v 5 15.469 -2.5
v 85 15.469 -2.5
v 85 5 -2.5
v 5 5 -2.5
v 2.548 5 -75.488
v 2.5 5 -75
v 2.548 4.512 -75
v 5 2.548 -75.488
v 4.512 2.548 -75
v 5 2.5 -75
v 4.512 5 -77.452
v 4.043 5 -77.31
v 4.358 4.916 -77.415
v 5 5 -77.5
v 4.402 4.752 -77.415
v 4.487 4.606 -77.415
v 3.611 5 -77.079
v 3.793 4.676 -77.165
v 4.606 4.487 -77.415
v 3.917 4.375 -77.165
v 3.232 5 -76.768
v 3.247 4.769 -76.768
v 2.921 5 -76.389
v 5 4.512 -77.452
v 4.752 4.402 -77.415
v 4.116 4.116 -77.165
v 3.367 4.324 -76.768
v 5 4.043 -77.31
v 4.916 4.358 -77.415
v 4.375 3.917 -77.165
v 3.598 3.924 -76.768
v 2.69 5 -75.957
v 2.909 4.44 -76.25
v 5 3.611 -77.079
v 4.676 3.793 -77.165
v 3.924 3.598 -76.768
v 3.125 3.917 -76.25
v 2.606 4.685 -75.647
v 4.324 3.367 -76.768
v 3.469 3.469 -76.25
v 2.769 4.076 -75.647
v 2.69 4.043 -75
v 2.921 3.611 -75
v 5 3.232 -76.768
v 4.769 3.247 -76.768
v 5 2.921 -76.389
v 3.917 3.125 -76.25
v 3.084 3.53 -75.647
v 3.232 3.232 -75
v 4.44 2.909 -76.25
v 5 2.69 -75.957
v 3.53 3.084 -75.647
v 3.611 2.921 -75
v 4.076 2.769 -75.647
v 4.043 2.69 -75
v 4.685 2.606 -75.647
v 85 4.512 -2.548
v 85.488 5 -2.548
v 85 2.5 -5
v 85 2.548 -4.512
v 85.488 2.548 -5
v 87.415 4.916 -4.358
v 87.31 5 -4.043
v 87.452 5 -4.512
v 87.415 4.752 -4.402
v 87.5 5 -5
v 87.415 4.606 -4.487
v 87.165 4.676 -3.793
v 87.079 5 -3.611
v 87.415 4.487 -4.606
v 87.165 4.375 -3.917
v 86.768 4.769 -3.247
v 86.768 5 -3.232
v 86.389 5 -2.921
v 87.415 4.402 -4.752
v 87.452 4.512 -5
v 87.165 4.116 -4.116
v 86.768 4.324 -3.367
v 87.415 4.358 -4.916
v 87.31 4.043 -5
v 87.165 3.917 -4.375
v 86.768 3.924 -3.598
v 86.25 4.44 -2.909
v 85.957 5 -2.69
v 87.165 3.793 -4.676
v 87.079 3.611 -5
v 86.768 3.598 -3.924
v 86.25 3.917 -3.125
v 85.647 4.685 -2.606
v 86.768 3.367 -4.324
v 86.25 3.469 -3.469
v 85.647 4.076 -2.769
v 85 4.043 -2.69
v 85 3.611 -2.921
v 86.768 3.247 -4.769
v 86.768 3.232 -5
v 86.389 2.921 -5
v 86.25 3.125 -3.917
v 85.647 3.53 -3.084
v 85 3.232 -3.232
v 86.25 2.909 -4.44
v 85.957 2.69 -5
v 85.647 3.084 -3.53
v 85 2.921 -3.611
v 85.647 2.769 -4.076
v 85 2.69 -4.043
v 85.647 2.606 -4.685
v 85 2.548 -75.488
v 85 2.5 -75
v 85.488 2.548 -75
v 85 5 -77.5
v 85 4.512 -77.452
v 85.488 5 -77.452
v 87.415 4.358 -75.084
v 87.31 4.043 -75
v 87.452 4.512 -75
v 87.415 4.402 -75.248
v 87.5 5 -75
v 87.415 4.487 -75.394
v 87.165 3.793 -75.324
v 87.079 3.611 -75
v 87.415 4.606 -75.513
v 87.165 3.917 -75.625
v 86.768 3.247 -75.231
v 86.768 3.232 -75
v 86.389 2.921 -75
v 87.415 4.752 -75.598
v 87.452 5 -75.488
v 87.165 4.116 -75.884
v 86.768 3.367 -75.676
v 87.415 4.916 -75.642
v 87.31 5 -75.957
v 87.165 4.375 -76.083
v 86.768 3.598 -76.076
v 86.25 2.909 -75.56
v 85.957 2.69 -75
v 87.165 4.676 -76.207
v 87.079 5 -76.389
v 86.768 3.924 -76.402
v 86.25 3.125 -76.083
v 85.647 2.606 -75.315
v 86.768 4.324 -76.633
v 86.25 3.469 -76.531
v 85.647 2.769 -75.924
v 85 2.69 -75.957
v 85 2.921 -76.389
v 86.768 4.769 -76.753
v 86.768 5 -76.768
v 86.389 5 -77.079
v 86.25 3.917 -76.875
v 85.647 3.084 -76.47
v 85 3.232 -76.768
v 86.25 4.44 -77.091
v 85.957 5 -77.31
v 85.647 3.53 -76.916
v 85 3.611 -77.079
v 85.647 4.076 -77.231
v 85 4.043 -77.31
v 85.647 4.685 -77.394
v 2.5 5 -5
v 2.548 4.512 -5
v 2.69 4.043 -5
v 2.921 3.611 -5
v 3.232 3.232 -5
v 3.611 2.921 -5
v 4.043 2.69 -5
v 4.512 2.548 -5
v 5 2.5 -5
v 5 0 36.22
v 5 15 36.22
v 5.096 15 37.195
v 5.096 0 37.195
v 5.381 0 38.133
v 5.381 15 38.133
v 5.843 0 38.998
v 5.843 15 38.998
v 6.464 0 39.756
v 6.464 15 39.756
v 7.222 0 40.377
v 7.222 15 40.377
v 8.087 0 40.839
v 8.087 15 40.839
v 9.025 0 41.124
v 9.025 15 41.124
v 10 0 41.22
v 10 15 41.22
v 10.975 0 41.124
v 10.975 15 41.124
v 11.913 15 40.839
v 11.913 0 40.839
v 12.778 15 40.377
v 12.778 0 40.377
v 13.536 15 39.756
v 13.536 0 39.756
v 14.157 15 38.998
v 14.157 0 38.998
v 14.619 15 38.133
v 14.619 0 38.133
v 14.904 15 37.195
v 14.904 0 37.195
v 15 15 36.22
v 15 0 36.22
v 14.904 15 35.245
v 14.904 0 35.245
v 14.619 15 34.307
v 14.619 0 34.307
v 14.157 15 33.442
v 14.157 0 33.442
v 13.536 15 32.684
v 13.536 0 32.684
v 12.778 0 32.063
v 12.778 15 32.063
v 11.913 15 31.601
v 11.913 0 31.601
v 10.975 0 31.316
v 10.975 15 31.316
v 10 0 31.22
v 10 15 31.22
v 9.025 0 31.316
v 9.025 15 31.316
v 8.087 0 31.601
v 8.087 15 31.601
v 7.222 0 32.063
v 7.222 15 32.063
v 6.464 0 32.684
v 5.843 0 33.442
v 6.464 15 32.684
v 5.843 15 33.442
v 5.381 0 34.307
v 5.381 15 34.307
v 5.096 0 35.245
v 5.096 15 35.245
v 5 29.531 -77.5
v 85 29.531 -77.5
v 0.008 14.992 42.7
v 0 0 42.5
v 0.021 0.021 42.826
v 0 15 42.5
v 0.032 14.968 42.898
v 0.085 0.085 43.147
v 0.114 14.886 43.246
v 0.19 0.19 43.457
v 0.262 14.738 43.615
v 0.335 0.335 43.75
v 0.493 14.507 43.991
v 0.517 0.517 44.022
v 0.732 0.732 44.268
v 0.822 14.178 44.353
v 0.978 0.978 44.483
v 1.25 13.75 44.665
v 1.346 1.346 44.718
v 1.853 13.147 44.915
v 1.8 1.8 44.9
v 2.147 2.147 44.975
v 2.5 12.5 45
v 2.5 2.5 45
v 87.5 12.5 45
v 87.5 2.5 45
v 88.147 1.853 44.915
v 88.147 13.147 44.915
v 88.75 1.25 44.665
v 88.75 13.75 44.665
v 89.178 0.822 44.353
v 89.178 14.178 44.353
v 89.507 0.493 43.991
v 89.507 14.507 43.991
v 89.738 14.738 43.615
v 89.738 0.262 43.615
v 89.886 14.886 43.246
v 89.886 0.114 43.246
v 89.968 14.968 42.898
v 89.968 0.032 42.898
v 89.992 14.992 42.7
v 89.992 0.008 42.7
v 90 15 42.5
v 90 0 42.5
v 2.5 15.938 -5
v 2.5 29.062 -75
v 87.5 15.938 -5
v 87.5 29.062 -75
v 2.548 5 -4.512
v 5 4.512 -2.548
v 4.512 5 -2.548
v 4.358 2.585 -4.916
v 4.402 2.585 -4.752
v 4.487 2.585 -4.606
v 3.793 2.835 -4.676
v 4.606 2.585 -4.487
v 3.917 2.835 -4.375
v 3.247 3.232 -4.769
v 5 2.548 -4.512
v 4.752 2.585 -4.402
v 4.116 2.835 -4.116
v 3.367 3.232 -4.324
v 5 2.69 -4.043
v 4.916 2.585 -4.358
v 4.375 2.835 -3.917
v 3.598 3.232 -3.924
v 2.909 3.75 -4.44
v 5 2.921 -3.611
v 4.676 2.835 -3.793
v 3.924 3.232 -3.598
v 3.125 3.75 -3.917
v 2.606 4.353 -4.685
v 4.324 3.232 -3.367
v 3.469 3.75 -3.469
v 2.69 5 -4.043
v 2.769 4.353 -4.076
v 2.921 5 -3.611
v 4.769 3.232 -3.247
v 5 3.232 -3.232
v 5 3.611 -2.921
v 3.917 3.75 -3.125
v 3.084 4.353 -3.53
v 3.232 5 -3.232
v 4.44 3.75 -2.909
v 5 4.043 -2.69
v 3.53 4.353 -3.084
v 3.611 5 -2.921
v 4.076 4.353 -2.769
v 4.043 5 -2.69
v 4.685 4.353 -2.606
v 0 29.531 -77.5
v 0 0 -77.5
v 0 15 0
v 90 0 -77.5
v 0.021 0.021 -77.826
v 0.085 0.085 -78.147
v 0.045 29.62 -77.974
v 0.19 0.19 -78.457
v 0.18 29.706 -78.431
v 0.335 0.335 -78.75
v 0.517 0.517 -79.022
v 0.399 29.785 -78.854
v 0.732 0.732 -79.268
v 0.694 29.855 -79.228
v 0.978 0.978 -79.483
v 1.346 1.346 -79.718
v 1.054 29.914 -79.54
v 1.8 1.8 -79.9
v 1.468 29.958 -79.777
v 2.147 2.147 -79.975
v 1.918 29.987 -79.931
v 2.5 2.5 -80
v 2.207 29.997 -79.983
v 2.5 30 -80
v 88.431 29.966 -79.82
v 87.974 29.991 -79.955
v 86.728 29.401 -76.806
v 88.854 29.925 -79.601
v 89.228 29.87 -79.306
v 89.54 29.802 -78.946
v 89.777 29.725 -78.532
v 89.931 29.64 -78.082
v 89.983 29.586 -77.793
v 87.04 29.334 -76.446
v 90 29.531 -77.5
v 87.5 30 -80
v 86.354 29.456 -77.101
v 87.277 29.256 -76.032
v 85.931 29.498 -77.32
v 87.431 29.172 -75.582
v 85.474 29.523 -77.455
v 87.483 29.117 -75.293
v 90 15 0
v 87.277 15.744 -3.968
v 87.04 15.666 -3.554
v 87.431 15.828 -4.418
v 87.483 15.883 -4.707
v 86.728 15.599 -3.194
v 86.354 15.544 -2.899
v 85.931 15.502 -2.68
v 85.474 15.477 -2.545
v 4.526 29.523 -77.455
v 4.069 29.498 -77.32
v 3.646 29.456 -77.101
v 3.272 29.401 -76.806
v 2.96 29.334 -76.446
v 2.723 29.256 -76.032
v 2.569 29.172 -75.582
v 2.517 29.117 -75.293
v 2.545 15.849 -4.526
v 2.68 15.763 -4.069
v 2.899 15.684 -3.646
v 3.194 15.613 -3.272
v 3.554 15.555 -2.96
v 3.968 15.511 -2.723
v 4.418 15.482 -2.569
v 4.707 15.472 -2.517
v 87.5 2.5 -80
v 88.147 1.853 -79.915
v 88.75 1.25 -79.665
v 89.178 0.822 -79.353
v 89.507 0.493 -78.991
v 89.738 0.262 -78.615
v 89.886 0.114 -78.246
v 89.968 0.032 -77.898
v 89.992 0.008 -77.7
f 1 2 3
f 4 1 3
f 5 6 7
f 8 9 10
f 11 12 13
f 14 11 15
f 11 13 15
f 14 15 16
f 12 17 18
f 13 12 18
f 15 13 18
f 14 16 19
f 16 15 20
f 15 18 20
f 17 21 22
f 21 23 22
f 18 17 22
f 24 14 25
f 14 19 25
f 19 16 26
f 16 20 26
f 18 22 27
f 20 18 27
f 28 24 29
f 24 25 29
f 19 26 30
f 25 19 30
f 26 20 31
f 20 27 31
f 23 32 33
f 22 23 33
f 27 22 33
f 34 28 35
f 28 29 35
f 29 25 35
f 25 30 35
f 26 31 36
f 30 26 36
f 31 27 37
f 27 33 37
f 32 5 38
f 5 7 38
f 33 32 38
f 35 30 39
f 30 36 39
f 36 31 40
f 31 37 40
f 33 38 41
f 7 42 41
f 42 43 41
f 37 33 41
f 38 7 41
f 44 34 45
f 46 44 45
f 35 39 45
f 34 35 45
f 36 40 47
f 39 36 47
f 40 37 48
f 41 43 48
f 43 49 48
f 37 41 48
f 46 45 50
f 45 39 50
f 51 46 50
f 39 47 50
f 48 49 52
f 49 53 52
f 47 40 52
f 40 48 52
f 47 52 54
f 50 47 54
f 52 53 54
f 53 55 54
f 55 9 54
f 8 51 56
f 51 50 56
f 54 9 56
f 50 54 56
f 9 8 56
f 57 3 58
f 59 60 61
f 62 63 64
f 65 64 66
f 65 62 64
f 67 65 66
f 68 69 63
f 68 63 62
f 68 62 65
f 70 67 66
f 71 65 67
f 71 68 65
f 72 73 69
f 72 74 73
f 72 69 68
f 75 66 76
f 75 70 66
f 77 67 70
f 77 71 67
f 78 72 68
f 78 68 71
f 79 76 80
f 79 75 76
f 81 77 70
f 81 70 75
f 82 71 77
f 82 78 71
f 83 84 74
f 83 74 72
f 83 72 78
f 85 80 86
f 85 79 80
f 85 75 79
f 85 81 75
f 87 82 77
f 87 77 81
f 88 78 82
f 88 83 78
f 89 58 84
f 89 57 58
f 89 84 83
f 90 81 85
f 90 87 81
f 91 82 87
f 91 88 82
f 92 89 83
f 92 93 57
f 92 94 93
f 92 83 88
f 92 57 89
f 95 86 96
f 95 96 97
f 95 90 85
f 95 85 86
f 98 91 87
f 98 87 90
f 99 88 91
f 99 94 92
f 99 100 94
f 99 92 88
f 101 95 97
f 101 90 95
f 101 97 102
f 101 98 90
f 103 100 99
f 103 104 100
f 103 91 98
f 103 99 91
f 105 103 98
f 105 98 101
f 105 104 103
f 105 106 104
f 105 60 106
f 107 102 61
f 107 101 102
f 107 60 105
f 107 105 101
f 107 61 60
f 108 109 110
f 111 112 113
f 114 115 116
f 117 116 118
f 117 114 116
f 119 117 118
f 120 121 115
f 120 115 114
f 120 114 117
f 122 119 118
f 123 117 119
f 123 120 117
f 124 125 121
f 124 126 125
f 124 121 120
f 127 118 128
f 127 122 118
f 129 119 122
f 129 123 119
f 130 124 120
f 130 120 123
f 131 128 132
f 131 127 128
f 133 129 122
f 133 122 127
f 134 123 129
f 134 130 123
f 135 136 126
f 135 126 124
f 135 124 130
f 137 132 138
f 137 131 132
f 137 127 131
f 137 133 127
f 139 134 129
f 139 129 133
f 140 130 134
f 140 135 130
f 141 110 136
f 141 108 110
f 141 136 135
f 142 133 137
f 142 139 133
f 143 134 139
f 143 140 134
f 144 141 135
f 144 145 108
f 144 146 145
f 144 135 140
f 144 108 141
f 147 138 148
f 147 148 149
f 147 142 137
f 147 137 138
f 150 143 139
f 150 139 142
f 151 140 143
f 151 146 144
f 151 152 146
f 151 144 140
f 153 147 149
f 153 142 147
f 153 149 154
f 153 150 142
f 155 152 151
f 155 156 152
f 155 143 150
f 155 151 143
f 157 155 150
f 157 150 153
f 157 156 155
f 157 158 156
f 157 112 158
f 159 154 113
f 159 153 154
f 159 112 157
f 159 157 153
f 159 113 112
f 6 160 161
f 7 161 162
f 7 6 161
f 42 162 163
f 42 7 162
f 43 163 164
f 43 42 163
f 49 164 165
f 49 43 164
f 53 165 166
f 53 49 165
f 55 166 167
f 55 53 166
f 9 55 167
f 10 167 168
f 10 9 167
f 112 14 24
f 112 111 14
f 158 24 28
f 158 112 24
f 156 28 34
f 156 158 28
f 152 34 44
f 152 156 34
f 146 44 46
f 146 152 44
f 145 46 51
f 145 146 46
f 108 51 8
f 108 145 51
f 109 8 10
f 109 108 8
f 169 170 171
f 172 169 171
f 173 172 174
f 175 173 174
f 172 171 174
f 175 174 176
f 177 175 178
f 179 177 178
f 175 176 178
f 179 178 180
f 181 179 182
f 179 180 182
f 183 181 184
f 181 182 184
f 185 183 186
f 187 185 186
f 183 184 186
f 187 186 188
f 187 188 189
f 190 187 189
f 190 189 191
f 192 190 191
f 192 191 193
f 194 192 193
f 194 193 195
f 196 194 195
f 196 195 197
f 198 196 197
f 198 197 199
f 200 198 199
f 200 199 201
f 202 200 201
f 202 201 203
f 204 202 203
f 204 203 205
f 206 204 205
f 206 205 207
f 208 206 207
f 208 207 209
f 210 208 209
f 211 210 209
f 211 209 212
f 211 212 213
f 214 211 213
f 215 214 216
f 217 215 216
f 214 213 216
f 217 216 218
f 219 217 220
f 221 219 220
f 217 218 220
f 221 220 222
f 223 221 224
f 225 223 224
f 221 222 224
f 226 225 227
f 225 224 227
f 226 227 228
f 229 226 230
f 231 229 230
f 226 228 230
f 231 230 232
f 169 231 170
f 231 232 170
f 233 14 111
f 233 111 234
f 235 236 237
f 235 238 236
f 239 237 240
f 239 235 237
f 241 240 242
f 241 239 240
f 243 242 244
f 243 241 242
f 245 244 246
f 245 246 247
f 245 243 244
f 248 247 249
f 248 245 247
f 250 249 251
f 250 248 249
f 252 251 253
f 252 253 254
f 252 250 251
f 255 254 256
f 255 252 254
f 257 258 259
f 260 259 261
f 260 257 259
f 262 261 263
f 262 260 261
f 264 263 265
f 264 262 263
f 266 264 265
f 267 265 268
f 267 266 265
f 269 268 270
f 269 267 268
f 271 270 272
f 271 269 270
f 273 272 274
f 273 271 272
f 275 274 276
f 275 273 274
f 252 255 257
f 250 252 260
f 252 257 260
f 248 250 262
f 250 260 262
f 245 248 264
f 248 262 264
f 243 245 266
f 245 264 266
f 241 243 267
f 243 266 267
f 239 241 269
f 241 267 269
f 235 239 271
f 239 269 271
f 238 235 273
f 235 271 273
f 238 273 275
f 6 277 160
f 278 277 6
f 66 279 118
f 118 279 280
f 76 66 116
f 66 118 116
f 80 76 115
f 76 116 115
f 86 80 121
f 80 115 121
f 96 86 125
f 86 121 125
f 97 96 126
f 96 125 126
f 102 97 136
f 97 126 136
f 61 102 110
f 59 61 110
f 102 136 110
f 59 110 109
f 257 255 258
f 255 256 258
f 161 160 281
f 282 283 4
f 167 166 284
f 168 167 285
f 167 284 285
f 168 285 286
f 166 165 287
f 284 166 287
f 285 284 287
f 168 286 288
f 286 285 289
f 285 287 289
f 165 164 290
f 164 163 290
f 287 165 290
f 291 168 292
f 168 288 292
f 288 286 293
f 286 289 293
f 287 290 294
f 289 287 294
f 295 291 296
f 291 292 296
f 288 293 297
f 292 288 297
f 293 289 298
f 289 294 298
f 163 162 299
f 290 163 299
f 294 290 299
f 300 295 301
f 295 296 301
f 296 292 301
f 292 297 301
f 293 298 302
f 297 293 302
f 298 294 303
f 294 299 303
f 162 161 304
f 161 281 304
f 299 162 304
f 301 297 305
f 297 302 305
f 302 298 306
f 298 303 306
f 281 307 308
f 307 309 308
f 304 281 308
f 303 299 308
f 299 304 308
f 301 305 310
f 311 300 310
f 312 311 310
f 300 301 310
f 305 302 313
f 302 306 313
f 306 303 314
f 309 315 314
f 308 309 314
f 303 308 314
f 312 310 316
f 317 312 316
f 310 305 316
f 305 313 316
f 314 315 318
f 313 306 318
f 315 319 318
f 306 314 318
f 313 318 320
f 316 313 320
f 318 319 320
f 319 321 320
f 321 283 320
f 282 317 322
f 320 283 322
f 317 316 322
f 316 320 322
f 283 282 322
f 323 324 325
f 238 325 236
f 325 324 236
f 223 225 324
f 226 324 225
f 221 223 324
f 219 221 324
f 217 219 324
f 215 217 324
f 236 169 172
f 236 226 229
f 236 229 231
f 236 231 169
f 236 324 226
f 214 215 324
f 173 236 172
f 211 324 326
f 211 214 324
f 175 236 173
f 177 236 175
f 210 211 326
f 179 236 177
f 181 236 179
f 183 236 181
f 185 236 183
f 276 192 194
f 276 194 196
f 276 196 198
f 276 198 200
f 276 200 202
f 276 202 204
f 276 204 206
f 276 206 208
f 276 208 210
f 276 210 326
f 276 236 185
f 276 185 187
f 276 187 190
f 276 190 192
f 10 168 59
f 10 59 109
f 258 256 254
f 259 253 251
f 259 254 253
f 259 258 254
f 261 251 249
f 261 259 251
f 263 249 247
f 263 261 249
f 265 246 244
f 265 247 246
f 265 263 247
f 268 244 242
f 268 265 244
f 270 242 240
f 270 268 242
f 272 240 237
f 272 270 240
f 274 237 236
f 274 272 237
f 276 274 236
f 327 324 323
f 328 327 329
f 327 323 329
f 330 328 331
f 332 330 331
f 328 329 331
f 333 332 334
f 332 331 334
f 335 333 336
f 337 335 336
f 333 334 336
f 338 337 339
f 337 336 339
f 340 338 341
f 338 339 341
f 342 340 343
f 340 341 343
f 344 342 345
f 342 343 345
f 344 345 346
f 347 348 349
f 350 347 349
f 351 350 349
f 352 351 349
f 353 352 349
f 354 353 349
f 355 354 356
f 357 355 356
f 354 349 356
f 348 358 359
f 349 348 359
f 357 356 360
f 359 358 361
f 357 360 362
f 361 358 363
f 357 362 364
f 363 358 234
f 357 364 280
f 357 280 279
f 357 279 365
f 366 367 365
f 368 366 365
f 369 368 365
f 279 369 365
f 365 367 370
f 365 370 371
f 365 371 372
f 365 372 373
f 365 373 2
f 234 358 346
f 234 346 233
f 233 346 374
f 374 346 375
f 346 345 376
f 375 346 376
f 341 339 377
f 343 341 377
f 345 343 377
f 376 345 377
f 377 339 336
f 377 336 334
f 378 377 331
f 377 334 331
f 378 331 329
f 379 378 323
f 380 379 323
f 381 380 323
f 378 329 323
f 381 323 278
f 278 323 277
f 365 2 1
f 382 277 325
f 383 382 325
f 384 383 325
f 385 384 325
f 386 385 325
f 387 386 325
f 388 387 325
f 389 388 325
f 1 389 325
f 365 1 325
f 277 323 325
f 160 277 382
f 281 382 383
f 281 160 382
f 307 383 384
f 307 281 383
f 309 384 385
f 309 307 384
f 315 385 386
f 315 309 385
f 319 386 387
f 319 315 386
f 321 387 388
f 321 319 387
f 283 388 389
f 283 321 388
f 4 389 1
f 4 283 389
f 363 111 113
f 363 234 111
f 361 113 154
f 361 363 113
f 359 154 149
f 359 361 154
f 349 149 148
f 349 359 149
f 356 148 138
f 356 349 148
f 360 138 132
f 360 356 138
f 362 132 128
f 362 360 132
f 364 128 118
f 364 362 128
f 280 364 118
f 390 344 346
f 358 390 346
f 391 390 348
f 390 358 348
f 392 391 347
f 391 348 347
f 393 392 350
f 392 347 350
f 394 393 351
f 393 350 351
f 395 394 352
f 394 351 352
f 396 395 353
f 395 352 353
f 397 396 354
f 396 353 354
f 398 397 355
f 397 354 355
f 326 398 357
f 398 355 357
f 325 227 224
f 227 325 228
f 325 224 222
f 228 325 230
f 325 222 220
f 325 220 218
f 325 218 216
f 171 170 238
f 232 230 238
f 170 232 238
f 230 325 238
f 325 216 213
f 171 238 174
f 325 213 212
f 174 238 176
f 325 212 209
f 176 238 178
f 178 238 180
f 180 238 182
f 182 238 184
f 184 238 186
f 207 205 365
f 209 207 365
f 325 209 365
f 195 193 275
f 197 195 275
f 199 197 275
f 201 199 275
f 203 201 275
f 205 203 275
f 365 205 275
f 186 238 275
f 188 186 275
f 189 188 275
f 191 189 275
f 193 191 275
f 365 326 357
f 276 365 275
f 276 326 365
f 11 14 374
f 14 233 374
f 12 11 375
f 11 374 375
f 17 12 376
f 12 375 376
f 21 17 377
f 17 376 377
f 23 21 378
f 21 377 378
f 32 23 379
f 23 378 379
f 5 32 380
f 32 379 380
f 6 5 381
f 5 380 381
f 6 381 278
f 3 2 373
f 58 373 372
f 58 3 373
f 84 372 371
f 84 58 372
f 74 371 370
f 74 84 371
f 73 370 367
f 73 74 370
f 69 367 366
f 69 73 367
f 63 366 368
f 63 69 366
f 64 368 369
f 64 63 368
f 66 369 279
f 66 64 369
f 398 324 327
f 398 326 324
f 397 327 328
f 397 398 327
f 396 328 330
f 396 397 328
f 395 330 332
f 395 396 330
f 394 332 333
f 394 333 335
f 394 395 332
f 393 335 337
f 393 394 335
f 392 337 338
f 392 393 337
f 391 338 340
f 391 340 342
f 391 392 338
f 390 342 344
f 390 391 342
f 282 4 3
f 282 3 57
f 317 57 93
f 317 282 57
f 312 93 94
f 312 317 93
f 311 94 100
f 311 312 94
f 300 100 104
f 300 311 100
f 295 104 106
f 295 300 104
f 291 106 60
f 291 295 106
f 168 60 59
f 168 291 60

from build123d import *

# Parameters (mm, degrees)
BOSS_EXTRUDE1_DEPTH    = 90
SHELL1_T               = -2.5
SKETCH2_W              = 90
SKETCH2_H              = 45
BOSS_EXTRUDE2_DEPTH    = 15
F_10_0MM_DOWEL_HOLE1_D = 10
FILLET1_R              = 2.5


with BuildPart() as part:
    # Sketch1 → Boss-Extrude1 (new body)
    with BuildSketch(Plane(origin=(0, 0, 0), x_dir=(0, 0, -1), z_dir=(1, 0, 0))):
        Polygon((0, 0), (80, 0), (80, 30), (0, 15), align=None)
    extrude(amount=BOSS_EXTRUDE1_DEPTH)

    # Shell1
    shell1_openings = [part.faces().sort_by_distance(p)[0] for p in [
        (45, 22.5, -40),
    ]]
    offset(amount=SHELL1_T, openings=shell1_openings, kind=Kind.INTERSECTION)

    # Sketch2 → Boss-Extrude2 (add)
    with BuildSketch(Plane.XZ):
        with Locations((45, 22.5)):
            Rectangle(SKETCH2_W, SKETCH2_H)
    extrude(amount=-BOSS_EXTRUDE2_DEPTH)

    # Ø10.0mm Dowel Hole1 (through all)
    with Locations(Plane.XZ):
        with Locations((10, 36.22)):
            Hole(F_10_0MM_DOWEL_HOLE1_D / 2)

    # Fillet1
    fillet1_edges = [part.edges().sort_by_distance(p)[0] for p in [
        (90, 15, -80),
        (2.5, 8.984375, -2.5),
        (2.5, 2.5, -40),
        (45, 2.5, -2.5),
        (2.5, 16.015625, -77.5),
        (45, 2.5, -77.5),
        (87.5, 8.984375, -2.5),
        (87.5, 2.5, -40),
        (87.5, 16.015625, -77.5),
        (45, 15, 45),
        (0, 7.5, 45),
        (90, 7.5, 45),
        (45, 0, 45),
        (0, 15, -80),
        (45, 0, -80),
    ]]
    fillet(fillet1_edges, radius=FILLET1_R)


solid = part.part
